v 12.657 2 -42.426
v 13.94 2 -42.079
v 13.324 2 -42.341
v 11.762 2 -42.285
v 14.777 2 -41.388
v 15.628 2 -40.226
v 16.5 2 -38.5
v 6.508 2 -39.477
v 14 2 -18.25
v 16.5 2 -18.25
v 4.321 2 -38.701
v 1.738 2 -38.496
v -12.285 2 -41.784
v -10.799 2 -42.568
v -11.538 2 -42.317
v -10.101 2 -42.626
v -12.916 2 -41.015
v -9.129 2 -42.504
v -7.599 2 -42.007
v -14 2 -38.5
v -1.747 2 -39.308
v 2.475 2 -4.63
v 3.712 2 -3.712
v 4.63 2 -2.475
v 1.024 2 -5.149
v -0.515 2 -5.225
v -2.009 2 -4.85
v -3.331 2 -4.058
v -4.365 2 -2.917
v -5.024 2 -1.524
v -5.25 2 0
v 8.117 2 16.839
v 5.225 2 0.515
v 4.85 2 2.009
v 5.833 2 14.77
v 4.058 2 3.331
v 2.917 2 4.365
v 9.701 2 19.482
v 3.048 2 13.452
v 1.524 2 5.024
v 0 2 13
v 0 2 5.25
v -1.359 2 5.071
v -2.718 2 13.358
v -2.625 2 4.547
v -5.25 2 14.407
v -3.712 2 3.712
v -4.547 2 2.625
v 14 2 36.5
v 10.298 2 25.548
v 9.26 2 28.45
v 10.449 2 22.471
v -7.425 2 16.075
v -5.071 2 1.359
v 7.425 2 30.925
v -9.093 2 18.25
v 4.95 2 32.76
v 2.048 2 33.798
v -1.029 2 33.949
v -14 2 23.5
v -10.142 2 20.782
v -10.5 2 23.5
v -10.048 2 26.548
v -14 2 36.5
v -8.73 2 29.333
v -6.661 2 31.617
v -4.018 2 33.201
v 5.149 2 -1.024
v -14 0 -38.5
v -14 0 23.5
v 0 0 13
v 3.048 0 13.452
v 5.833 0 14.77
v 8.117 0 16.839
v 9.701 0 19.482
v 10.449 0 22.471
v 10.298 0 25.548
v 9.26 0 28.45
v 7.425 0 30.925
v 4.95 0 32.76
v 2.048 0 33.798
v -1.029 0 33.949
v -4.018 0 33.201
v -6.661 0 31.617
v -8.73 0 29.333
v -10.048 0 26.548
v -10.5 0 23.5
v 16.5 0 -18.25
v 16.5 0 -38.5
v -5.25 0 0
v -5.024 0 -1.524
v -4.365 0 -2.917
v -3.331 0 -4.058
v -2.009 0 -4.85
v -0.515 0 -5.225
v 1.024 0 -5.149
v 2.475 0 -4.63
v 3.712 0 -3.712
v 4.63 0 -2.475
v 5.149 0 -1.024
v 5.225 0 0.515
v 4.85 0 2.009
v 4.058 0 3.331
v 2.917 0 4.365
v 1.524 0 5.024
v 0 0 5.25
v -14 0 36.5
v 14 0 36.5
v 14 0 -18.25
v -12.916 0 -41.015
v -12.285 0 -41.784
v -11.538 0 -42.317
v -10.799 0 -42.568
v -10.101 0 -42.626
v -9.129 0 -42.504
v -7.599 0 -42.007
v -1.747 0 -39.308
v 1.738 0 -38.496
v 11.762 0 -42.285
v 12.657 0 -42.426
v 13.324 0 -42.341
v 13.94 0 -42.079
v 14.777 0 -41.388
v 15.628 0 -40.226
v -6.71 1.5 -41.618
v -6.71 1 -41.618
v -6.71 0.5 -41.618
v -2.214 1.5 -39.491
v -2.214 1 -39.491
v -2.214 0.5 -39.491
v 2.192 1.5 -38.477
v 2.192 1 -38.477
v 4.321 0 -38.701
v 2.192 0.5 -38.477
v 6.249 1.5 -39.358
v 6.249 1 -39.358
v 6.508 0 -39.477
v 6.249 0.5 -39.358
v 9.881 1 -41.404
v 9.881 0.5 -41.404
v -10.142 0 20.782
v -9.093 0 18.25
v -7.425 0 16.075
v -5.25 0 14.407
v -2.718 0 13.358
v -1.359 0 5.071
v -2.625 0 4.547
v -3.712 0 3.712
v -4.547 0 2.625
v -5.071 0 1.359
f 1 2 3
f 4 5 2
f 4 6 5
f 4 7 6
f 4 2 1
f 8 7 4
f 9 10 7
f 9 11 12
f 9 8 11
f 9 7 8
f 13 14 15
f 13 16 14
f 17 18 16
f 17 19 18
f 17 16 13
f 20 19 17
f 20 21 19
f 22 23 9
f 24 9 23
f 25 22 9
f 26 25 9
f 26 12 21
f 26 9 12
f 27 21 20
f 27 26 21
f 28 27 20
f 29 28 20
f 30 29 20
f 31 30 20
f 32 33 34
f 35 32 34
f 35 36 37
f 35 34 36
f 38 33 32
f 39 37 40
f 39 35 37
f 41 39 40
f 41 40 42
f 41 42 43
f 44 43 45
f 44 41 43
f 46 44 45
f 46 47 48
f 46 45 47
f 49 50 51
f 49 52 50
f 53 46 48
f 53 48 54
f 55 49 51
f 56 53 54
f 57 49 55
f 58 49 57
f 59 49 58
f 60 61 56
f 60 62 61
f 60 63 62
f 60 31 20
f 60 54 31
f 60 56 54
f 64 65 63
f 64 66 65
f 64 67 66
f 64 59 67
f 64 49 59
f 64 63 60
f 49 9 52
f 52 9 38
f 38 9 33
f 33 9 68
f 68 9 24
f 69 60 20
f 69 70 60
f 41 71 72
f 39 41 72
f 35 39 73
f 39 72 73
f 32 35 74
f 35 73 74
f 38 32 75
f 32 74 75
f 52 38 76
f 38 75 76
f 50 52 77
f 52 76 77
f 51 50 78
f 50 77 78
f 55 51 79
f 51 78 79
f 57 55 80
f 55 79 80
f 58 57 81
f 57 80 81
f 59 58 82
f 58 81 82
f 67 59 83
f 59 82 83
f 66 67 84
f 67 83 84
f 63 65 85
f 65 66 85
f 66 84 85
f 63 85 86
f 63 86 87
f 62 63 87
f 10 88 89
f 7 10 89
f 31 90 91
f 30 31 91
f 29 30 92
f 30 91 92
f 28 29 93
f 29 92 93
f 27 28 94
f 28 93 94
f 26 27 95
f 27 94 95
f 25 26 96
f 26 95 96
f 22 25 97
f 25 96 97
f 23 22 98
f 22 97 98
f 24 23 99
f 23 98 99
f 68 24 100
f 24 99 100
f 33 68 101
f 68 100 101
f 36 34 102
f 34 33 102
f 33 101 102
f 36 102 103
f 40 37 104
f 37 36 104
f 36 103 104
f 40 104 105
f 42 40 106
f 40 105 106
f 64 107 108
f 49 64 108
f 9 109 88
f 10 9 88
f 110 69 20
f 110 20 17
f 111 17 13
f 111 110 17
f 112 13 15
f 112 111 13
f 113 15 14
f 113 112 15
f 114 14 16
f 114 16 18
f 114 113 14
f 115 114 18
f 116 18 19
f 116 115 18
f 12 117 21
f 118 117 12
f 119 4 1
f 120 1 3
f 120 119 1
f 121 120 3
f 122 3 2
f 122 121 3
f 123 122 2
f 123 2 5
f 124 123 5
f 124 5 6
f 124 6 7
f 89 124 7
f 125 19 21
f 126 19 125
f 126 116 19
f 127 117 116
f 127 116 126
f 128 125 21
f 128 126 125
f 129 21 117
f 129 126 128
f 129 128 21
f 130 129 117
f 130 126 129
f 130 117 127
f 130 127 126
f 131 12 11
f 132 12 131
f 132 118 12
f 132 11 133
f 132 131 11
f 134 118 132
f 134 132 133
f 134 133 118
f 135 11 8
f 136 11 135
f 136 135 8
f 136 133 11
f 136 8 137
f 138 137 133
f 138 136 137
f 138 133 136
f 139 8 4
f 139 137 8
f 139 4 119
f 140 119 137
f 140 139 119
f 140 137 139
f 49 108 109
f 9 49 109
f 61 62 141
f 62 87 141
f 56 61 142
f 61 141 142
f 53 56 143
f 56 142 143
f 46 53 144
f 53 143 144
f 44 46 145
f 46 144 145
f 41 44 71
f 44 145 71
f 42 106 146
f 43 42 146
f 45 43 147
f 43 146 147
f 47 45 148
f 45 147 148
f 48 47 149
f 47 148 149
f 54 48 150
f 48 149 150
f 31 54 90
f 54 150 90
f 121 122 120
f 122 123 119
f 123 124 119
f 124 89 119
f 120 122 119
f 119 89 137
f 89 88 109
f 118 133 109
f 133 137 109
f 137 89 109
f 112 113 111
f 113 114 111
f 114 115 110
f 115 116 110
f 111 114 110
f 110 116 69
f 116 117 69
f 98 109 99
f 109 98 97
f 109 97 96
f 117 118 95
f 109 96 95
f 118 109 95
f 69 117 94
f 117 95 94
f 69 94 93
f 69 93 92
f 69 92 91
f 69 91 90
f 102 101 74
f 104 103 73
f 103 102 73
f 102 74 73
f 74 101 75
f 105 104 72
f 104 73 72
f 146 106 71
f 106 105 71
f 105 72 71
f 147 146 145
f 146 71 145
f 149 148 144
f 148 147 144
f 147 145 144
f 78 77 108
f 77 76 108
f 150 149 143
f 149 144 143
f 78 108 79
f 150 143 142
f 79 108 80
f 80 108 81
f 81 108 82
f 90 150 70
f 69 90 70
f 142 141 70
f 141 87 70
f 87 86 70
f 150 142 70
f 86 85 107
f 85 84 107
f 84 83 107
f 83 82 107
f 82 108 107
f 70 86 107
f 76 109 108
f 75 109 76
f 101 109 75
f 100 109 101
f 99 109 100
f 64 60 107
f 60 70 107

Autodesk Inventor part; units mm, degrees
ref_plane "YZ Plane" through (0, 0, 0) normal (1, 0, 0) x (0, 1, 0)
ref_plane "XZ Plane" through (0, 0, 0) normal (0, 1, 0) x (-1, 0, 0)
ref_plane "XY Plane" through (0, 0, 0) normal (0, 0, 1) x (1, 0, 0)
sketch "Sketch1" plane through (0, 0, 0) normal (0, 1, 0) x (-1, 0, 0)
  circle A0 centre (0, 0) radius 5.25
  line L0 (0, 0) -> (0, 23.5)
  circle A1 centre (0, 23.5) radius 10.5
  line L1 (0, 23.5) -> (14, 23.5)
  line L2 (14, 23.5) -> (14, 36.5)
  line L3 (14, 36.5) -> (-14, 36.5)
  line L4 (-14, 36.5) -> (-14, -18.25)
  line L5 (-14, -18.25) -> (-16.5, -18.25)
  line L6 (-16.5, -18.25) -> (-16.5, -38.5)
  line L7 (14, 23.5) -> (14, -38.5)
  spline S0 degree 4 poles (14, -38.5) (9.1992, -54.9126) (-5.1458, -16.9331) (-9.6244, -54.3444) (-16.5, -38.5) knots 0 0 0 0 0 1 1 1 1 1
  point P0 (7, -41.75)
  point P1 (-3, -38.5)
  point P2 (-10.5, -41.75)
  dimension "d0" = 10.5
  dimension "d2" = 23.5
  dimension "d3" = 21
  dimension "d4" = 14
  dimension "d5" = 13
  dimension "d6" = 28
  dimension "d7" = 54.75
  dimension "d8" = 2.5
  dimension "d9" = 20.25
  dimension "d10" = 62
extrude "Extrusion1" add sketch "Sketch1" along normal blind 2
properties part number "Tira"
